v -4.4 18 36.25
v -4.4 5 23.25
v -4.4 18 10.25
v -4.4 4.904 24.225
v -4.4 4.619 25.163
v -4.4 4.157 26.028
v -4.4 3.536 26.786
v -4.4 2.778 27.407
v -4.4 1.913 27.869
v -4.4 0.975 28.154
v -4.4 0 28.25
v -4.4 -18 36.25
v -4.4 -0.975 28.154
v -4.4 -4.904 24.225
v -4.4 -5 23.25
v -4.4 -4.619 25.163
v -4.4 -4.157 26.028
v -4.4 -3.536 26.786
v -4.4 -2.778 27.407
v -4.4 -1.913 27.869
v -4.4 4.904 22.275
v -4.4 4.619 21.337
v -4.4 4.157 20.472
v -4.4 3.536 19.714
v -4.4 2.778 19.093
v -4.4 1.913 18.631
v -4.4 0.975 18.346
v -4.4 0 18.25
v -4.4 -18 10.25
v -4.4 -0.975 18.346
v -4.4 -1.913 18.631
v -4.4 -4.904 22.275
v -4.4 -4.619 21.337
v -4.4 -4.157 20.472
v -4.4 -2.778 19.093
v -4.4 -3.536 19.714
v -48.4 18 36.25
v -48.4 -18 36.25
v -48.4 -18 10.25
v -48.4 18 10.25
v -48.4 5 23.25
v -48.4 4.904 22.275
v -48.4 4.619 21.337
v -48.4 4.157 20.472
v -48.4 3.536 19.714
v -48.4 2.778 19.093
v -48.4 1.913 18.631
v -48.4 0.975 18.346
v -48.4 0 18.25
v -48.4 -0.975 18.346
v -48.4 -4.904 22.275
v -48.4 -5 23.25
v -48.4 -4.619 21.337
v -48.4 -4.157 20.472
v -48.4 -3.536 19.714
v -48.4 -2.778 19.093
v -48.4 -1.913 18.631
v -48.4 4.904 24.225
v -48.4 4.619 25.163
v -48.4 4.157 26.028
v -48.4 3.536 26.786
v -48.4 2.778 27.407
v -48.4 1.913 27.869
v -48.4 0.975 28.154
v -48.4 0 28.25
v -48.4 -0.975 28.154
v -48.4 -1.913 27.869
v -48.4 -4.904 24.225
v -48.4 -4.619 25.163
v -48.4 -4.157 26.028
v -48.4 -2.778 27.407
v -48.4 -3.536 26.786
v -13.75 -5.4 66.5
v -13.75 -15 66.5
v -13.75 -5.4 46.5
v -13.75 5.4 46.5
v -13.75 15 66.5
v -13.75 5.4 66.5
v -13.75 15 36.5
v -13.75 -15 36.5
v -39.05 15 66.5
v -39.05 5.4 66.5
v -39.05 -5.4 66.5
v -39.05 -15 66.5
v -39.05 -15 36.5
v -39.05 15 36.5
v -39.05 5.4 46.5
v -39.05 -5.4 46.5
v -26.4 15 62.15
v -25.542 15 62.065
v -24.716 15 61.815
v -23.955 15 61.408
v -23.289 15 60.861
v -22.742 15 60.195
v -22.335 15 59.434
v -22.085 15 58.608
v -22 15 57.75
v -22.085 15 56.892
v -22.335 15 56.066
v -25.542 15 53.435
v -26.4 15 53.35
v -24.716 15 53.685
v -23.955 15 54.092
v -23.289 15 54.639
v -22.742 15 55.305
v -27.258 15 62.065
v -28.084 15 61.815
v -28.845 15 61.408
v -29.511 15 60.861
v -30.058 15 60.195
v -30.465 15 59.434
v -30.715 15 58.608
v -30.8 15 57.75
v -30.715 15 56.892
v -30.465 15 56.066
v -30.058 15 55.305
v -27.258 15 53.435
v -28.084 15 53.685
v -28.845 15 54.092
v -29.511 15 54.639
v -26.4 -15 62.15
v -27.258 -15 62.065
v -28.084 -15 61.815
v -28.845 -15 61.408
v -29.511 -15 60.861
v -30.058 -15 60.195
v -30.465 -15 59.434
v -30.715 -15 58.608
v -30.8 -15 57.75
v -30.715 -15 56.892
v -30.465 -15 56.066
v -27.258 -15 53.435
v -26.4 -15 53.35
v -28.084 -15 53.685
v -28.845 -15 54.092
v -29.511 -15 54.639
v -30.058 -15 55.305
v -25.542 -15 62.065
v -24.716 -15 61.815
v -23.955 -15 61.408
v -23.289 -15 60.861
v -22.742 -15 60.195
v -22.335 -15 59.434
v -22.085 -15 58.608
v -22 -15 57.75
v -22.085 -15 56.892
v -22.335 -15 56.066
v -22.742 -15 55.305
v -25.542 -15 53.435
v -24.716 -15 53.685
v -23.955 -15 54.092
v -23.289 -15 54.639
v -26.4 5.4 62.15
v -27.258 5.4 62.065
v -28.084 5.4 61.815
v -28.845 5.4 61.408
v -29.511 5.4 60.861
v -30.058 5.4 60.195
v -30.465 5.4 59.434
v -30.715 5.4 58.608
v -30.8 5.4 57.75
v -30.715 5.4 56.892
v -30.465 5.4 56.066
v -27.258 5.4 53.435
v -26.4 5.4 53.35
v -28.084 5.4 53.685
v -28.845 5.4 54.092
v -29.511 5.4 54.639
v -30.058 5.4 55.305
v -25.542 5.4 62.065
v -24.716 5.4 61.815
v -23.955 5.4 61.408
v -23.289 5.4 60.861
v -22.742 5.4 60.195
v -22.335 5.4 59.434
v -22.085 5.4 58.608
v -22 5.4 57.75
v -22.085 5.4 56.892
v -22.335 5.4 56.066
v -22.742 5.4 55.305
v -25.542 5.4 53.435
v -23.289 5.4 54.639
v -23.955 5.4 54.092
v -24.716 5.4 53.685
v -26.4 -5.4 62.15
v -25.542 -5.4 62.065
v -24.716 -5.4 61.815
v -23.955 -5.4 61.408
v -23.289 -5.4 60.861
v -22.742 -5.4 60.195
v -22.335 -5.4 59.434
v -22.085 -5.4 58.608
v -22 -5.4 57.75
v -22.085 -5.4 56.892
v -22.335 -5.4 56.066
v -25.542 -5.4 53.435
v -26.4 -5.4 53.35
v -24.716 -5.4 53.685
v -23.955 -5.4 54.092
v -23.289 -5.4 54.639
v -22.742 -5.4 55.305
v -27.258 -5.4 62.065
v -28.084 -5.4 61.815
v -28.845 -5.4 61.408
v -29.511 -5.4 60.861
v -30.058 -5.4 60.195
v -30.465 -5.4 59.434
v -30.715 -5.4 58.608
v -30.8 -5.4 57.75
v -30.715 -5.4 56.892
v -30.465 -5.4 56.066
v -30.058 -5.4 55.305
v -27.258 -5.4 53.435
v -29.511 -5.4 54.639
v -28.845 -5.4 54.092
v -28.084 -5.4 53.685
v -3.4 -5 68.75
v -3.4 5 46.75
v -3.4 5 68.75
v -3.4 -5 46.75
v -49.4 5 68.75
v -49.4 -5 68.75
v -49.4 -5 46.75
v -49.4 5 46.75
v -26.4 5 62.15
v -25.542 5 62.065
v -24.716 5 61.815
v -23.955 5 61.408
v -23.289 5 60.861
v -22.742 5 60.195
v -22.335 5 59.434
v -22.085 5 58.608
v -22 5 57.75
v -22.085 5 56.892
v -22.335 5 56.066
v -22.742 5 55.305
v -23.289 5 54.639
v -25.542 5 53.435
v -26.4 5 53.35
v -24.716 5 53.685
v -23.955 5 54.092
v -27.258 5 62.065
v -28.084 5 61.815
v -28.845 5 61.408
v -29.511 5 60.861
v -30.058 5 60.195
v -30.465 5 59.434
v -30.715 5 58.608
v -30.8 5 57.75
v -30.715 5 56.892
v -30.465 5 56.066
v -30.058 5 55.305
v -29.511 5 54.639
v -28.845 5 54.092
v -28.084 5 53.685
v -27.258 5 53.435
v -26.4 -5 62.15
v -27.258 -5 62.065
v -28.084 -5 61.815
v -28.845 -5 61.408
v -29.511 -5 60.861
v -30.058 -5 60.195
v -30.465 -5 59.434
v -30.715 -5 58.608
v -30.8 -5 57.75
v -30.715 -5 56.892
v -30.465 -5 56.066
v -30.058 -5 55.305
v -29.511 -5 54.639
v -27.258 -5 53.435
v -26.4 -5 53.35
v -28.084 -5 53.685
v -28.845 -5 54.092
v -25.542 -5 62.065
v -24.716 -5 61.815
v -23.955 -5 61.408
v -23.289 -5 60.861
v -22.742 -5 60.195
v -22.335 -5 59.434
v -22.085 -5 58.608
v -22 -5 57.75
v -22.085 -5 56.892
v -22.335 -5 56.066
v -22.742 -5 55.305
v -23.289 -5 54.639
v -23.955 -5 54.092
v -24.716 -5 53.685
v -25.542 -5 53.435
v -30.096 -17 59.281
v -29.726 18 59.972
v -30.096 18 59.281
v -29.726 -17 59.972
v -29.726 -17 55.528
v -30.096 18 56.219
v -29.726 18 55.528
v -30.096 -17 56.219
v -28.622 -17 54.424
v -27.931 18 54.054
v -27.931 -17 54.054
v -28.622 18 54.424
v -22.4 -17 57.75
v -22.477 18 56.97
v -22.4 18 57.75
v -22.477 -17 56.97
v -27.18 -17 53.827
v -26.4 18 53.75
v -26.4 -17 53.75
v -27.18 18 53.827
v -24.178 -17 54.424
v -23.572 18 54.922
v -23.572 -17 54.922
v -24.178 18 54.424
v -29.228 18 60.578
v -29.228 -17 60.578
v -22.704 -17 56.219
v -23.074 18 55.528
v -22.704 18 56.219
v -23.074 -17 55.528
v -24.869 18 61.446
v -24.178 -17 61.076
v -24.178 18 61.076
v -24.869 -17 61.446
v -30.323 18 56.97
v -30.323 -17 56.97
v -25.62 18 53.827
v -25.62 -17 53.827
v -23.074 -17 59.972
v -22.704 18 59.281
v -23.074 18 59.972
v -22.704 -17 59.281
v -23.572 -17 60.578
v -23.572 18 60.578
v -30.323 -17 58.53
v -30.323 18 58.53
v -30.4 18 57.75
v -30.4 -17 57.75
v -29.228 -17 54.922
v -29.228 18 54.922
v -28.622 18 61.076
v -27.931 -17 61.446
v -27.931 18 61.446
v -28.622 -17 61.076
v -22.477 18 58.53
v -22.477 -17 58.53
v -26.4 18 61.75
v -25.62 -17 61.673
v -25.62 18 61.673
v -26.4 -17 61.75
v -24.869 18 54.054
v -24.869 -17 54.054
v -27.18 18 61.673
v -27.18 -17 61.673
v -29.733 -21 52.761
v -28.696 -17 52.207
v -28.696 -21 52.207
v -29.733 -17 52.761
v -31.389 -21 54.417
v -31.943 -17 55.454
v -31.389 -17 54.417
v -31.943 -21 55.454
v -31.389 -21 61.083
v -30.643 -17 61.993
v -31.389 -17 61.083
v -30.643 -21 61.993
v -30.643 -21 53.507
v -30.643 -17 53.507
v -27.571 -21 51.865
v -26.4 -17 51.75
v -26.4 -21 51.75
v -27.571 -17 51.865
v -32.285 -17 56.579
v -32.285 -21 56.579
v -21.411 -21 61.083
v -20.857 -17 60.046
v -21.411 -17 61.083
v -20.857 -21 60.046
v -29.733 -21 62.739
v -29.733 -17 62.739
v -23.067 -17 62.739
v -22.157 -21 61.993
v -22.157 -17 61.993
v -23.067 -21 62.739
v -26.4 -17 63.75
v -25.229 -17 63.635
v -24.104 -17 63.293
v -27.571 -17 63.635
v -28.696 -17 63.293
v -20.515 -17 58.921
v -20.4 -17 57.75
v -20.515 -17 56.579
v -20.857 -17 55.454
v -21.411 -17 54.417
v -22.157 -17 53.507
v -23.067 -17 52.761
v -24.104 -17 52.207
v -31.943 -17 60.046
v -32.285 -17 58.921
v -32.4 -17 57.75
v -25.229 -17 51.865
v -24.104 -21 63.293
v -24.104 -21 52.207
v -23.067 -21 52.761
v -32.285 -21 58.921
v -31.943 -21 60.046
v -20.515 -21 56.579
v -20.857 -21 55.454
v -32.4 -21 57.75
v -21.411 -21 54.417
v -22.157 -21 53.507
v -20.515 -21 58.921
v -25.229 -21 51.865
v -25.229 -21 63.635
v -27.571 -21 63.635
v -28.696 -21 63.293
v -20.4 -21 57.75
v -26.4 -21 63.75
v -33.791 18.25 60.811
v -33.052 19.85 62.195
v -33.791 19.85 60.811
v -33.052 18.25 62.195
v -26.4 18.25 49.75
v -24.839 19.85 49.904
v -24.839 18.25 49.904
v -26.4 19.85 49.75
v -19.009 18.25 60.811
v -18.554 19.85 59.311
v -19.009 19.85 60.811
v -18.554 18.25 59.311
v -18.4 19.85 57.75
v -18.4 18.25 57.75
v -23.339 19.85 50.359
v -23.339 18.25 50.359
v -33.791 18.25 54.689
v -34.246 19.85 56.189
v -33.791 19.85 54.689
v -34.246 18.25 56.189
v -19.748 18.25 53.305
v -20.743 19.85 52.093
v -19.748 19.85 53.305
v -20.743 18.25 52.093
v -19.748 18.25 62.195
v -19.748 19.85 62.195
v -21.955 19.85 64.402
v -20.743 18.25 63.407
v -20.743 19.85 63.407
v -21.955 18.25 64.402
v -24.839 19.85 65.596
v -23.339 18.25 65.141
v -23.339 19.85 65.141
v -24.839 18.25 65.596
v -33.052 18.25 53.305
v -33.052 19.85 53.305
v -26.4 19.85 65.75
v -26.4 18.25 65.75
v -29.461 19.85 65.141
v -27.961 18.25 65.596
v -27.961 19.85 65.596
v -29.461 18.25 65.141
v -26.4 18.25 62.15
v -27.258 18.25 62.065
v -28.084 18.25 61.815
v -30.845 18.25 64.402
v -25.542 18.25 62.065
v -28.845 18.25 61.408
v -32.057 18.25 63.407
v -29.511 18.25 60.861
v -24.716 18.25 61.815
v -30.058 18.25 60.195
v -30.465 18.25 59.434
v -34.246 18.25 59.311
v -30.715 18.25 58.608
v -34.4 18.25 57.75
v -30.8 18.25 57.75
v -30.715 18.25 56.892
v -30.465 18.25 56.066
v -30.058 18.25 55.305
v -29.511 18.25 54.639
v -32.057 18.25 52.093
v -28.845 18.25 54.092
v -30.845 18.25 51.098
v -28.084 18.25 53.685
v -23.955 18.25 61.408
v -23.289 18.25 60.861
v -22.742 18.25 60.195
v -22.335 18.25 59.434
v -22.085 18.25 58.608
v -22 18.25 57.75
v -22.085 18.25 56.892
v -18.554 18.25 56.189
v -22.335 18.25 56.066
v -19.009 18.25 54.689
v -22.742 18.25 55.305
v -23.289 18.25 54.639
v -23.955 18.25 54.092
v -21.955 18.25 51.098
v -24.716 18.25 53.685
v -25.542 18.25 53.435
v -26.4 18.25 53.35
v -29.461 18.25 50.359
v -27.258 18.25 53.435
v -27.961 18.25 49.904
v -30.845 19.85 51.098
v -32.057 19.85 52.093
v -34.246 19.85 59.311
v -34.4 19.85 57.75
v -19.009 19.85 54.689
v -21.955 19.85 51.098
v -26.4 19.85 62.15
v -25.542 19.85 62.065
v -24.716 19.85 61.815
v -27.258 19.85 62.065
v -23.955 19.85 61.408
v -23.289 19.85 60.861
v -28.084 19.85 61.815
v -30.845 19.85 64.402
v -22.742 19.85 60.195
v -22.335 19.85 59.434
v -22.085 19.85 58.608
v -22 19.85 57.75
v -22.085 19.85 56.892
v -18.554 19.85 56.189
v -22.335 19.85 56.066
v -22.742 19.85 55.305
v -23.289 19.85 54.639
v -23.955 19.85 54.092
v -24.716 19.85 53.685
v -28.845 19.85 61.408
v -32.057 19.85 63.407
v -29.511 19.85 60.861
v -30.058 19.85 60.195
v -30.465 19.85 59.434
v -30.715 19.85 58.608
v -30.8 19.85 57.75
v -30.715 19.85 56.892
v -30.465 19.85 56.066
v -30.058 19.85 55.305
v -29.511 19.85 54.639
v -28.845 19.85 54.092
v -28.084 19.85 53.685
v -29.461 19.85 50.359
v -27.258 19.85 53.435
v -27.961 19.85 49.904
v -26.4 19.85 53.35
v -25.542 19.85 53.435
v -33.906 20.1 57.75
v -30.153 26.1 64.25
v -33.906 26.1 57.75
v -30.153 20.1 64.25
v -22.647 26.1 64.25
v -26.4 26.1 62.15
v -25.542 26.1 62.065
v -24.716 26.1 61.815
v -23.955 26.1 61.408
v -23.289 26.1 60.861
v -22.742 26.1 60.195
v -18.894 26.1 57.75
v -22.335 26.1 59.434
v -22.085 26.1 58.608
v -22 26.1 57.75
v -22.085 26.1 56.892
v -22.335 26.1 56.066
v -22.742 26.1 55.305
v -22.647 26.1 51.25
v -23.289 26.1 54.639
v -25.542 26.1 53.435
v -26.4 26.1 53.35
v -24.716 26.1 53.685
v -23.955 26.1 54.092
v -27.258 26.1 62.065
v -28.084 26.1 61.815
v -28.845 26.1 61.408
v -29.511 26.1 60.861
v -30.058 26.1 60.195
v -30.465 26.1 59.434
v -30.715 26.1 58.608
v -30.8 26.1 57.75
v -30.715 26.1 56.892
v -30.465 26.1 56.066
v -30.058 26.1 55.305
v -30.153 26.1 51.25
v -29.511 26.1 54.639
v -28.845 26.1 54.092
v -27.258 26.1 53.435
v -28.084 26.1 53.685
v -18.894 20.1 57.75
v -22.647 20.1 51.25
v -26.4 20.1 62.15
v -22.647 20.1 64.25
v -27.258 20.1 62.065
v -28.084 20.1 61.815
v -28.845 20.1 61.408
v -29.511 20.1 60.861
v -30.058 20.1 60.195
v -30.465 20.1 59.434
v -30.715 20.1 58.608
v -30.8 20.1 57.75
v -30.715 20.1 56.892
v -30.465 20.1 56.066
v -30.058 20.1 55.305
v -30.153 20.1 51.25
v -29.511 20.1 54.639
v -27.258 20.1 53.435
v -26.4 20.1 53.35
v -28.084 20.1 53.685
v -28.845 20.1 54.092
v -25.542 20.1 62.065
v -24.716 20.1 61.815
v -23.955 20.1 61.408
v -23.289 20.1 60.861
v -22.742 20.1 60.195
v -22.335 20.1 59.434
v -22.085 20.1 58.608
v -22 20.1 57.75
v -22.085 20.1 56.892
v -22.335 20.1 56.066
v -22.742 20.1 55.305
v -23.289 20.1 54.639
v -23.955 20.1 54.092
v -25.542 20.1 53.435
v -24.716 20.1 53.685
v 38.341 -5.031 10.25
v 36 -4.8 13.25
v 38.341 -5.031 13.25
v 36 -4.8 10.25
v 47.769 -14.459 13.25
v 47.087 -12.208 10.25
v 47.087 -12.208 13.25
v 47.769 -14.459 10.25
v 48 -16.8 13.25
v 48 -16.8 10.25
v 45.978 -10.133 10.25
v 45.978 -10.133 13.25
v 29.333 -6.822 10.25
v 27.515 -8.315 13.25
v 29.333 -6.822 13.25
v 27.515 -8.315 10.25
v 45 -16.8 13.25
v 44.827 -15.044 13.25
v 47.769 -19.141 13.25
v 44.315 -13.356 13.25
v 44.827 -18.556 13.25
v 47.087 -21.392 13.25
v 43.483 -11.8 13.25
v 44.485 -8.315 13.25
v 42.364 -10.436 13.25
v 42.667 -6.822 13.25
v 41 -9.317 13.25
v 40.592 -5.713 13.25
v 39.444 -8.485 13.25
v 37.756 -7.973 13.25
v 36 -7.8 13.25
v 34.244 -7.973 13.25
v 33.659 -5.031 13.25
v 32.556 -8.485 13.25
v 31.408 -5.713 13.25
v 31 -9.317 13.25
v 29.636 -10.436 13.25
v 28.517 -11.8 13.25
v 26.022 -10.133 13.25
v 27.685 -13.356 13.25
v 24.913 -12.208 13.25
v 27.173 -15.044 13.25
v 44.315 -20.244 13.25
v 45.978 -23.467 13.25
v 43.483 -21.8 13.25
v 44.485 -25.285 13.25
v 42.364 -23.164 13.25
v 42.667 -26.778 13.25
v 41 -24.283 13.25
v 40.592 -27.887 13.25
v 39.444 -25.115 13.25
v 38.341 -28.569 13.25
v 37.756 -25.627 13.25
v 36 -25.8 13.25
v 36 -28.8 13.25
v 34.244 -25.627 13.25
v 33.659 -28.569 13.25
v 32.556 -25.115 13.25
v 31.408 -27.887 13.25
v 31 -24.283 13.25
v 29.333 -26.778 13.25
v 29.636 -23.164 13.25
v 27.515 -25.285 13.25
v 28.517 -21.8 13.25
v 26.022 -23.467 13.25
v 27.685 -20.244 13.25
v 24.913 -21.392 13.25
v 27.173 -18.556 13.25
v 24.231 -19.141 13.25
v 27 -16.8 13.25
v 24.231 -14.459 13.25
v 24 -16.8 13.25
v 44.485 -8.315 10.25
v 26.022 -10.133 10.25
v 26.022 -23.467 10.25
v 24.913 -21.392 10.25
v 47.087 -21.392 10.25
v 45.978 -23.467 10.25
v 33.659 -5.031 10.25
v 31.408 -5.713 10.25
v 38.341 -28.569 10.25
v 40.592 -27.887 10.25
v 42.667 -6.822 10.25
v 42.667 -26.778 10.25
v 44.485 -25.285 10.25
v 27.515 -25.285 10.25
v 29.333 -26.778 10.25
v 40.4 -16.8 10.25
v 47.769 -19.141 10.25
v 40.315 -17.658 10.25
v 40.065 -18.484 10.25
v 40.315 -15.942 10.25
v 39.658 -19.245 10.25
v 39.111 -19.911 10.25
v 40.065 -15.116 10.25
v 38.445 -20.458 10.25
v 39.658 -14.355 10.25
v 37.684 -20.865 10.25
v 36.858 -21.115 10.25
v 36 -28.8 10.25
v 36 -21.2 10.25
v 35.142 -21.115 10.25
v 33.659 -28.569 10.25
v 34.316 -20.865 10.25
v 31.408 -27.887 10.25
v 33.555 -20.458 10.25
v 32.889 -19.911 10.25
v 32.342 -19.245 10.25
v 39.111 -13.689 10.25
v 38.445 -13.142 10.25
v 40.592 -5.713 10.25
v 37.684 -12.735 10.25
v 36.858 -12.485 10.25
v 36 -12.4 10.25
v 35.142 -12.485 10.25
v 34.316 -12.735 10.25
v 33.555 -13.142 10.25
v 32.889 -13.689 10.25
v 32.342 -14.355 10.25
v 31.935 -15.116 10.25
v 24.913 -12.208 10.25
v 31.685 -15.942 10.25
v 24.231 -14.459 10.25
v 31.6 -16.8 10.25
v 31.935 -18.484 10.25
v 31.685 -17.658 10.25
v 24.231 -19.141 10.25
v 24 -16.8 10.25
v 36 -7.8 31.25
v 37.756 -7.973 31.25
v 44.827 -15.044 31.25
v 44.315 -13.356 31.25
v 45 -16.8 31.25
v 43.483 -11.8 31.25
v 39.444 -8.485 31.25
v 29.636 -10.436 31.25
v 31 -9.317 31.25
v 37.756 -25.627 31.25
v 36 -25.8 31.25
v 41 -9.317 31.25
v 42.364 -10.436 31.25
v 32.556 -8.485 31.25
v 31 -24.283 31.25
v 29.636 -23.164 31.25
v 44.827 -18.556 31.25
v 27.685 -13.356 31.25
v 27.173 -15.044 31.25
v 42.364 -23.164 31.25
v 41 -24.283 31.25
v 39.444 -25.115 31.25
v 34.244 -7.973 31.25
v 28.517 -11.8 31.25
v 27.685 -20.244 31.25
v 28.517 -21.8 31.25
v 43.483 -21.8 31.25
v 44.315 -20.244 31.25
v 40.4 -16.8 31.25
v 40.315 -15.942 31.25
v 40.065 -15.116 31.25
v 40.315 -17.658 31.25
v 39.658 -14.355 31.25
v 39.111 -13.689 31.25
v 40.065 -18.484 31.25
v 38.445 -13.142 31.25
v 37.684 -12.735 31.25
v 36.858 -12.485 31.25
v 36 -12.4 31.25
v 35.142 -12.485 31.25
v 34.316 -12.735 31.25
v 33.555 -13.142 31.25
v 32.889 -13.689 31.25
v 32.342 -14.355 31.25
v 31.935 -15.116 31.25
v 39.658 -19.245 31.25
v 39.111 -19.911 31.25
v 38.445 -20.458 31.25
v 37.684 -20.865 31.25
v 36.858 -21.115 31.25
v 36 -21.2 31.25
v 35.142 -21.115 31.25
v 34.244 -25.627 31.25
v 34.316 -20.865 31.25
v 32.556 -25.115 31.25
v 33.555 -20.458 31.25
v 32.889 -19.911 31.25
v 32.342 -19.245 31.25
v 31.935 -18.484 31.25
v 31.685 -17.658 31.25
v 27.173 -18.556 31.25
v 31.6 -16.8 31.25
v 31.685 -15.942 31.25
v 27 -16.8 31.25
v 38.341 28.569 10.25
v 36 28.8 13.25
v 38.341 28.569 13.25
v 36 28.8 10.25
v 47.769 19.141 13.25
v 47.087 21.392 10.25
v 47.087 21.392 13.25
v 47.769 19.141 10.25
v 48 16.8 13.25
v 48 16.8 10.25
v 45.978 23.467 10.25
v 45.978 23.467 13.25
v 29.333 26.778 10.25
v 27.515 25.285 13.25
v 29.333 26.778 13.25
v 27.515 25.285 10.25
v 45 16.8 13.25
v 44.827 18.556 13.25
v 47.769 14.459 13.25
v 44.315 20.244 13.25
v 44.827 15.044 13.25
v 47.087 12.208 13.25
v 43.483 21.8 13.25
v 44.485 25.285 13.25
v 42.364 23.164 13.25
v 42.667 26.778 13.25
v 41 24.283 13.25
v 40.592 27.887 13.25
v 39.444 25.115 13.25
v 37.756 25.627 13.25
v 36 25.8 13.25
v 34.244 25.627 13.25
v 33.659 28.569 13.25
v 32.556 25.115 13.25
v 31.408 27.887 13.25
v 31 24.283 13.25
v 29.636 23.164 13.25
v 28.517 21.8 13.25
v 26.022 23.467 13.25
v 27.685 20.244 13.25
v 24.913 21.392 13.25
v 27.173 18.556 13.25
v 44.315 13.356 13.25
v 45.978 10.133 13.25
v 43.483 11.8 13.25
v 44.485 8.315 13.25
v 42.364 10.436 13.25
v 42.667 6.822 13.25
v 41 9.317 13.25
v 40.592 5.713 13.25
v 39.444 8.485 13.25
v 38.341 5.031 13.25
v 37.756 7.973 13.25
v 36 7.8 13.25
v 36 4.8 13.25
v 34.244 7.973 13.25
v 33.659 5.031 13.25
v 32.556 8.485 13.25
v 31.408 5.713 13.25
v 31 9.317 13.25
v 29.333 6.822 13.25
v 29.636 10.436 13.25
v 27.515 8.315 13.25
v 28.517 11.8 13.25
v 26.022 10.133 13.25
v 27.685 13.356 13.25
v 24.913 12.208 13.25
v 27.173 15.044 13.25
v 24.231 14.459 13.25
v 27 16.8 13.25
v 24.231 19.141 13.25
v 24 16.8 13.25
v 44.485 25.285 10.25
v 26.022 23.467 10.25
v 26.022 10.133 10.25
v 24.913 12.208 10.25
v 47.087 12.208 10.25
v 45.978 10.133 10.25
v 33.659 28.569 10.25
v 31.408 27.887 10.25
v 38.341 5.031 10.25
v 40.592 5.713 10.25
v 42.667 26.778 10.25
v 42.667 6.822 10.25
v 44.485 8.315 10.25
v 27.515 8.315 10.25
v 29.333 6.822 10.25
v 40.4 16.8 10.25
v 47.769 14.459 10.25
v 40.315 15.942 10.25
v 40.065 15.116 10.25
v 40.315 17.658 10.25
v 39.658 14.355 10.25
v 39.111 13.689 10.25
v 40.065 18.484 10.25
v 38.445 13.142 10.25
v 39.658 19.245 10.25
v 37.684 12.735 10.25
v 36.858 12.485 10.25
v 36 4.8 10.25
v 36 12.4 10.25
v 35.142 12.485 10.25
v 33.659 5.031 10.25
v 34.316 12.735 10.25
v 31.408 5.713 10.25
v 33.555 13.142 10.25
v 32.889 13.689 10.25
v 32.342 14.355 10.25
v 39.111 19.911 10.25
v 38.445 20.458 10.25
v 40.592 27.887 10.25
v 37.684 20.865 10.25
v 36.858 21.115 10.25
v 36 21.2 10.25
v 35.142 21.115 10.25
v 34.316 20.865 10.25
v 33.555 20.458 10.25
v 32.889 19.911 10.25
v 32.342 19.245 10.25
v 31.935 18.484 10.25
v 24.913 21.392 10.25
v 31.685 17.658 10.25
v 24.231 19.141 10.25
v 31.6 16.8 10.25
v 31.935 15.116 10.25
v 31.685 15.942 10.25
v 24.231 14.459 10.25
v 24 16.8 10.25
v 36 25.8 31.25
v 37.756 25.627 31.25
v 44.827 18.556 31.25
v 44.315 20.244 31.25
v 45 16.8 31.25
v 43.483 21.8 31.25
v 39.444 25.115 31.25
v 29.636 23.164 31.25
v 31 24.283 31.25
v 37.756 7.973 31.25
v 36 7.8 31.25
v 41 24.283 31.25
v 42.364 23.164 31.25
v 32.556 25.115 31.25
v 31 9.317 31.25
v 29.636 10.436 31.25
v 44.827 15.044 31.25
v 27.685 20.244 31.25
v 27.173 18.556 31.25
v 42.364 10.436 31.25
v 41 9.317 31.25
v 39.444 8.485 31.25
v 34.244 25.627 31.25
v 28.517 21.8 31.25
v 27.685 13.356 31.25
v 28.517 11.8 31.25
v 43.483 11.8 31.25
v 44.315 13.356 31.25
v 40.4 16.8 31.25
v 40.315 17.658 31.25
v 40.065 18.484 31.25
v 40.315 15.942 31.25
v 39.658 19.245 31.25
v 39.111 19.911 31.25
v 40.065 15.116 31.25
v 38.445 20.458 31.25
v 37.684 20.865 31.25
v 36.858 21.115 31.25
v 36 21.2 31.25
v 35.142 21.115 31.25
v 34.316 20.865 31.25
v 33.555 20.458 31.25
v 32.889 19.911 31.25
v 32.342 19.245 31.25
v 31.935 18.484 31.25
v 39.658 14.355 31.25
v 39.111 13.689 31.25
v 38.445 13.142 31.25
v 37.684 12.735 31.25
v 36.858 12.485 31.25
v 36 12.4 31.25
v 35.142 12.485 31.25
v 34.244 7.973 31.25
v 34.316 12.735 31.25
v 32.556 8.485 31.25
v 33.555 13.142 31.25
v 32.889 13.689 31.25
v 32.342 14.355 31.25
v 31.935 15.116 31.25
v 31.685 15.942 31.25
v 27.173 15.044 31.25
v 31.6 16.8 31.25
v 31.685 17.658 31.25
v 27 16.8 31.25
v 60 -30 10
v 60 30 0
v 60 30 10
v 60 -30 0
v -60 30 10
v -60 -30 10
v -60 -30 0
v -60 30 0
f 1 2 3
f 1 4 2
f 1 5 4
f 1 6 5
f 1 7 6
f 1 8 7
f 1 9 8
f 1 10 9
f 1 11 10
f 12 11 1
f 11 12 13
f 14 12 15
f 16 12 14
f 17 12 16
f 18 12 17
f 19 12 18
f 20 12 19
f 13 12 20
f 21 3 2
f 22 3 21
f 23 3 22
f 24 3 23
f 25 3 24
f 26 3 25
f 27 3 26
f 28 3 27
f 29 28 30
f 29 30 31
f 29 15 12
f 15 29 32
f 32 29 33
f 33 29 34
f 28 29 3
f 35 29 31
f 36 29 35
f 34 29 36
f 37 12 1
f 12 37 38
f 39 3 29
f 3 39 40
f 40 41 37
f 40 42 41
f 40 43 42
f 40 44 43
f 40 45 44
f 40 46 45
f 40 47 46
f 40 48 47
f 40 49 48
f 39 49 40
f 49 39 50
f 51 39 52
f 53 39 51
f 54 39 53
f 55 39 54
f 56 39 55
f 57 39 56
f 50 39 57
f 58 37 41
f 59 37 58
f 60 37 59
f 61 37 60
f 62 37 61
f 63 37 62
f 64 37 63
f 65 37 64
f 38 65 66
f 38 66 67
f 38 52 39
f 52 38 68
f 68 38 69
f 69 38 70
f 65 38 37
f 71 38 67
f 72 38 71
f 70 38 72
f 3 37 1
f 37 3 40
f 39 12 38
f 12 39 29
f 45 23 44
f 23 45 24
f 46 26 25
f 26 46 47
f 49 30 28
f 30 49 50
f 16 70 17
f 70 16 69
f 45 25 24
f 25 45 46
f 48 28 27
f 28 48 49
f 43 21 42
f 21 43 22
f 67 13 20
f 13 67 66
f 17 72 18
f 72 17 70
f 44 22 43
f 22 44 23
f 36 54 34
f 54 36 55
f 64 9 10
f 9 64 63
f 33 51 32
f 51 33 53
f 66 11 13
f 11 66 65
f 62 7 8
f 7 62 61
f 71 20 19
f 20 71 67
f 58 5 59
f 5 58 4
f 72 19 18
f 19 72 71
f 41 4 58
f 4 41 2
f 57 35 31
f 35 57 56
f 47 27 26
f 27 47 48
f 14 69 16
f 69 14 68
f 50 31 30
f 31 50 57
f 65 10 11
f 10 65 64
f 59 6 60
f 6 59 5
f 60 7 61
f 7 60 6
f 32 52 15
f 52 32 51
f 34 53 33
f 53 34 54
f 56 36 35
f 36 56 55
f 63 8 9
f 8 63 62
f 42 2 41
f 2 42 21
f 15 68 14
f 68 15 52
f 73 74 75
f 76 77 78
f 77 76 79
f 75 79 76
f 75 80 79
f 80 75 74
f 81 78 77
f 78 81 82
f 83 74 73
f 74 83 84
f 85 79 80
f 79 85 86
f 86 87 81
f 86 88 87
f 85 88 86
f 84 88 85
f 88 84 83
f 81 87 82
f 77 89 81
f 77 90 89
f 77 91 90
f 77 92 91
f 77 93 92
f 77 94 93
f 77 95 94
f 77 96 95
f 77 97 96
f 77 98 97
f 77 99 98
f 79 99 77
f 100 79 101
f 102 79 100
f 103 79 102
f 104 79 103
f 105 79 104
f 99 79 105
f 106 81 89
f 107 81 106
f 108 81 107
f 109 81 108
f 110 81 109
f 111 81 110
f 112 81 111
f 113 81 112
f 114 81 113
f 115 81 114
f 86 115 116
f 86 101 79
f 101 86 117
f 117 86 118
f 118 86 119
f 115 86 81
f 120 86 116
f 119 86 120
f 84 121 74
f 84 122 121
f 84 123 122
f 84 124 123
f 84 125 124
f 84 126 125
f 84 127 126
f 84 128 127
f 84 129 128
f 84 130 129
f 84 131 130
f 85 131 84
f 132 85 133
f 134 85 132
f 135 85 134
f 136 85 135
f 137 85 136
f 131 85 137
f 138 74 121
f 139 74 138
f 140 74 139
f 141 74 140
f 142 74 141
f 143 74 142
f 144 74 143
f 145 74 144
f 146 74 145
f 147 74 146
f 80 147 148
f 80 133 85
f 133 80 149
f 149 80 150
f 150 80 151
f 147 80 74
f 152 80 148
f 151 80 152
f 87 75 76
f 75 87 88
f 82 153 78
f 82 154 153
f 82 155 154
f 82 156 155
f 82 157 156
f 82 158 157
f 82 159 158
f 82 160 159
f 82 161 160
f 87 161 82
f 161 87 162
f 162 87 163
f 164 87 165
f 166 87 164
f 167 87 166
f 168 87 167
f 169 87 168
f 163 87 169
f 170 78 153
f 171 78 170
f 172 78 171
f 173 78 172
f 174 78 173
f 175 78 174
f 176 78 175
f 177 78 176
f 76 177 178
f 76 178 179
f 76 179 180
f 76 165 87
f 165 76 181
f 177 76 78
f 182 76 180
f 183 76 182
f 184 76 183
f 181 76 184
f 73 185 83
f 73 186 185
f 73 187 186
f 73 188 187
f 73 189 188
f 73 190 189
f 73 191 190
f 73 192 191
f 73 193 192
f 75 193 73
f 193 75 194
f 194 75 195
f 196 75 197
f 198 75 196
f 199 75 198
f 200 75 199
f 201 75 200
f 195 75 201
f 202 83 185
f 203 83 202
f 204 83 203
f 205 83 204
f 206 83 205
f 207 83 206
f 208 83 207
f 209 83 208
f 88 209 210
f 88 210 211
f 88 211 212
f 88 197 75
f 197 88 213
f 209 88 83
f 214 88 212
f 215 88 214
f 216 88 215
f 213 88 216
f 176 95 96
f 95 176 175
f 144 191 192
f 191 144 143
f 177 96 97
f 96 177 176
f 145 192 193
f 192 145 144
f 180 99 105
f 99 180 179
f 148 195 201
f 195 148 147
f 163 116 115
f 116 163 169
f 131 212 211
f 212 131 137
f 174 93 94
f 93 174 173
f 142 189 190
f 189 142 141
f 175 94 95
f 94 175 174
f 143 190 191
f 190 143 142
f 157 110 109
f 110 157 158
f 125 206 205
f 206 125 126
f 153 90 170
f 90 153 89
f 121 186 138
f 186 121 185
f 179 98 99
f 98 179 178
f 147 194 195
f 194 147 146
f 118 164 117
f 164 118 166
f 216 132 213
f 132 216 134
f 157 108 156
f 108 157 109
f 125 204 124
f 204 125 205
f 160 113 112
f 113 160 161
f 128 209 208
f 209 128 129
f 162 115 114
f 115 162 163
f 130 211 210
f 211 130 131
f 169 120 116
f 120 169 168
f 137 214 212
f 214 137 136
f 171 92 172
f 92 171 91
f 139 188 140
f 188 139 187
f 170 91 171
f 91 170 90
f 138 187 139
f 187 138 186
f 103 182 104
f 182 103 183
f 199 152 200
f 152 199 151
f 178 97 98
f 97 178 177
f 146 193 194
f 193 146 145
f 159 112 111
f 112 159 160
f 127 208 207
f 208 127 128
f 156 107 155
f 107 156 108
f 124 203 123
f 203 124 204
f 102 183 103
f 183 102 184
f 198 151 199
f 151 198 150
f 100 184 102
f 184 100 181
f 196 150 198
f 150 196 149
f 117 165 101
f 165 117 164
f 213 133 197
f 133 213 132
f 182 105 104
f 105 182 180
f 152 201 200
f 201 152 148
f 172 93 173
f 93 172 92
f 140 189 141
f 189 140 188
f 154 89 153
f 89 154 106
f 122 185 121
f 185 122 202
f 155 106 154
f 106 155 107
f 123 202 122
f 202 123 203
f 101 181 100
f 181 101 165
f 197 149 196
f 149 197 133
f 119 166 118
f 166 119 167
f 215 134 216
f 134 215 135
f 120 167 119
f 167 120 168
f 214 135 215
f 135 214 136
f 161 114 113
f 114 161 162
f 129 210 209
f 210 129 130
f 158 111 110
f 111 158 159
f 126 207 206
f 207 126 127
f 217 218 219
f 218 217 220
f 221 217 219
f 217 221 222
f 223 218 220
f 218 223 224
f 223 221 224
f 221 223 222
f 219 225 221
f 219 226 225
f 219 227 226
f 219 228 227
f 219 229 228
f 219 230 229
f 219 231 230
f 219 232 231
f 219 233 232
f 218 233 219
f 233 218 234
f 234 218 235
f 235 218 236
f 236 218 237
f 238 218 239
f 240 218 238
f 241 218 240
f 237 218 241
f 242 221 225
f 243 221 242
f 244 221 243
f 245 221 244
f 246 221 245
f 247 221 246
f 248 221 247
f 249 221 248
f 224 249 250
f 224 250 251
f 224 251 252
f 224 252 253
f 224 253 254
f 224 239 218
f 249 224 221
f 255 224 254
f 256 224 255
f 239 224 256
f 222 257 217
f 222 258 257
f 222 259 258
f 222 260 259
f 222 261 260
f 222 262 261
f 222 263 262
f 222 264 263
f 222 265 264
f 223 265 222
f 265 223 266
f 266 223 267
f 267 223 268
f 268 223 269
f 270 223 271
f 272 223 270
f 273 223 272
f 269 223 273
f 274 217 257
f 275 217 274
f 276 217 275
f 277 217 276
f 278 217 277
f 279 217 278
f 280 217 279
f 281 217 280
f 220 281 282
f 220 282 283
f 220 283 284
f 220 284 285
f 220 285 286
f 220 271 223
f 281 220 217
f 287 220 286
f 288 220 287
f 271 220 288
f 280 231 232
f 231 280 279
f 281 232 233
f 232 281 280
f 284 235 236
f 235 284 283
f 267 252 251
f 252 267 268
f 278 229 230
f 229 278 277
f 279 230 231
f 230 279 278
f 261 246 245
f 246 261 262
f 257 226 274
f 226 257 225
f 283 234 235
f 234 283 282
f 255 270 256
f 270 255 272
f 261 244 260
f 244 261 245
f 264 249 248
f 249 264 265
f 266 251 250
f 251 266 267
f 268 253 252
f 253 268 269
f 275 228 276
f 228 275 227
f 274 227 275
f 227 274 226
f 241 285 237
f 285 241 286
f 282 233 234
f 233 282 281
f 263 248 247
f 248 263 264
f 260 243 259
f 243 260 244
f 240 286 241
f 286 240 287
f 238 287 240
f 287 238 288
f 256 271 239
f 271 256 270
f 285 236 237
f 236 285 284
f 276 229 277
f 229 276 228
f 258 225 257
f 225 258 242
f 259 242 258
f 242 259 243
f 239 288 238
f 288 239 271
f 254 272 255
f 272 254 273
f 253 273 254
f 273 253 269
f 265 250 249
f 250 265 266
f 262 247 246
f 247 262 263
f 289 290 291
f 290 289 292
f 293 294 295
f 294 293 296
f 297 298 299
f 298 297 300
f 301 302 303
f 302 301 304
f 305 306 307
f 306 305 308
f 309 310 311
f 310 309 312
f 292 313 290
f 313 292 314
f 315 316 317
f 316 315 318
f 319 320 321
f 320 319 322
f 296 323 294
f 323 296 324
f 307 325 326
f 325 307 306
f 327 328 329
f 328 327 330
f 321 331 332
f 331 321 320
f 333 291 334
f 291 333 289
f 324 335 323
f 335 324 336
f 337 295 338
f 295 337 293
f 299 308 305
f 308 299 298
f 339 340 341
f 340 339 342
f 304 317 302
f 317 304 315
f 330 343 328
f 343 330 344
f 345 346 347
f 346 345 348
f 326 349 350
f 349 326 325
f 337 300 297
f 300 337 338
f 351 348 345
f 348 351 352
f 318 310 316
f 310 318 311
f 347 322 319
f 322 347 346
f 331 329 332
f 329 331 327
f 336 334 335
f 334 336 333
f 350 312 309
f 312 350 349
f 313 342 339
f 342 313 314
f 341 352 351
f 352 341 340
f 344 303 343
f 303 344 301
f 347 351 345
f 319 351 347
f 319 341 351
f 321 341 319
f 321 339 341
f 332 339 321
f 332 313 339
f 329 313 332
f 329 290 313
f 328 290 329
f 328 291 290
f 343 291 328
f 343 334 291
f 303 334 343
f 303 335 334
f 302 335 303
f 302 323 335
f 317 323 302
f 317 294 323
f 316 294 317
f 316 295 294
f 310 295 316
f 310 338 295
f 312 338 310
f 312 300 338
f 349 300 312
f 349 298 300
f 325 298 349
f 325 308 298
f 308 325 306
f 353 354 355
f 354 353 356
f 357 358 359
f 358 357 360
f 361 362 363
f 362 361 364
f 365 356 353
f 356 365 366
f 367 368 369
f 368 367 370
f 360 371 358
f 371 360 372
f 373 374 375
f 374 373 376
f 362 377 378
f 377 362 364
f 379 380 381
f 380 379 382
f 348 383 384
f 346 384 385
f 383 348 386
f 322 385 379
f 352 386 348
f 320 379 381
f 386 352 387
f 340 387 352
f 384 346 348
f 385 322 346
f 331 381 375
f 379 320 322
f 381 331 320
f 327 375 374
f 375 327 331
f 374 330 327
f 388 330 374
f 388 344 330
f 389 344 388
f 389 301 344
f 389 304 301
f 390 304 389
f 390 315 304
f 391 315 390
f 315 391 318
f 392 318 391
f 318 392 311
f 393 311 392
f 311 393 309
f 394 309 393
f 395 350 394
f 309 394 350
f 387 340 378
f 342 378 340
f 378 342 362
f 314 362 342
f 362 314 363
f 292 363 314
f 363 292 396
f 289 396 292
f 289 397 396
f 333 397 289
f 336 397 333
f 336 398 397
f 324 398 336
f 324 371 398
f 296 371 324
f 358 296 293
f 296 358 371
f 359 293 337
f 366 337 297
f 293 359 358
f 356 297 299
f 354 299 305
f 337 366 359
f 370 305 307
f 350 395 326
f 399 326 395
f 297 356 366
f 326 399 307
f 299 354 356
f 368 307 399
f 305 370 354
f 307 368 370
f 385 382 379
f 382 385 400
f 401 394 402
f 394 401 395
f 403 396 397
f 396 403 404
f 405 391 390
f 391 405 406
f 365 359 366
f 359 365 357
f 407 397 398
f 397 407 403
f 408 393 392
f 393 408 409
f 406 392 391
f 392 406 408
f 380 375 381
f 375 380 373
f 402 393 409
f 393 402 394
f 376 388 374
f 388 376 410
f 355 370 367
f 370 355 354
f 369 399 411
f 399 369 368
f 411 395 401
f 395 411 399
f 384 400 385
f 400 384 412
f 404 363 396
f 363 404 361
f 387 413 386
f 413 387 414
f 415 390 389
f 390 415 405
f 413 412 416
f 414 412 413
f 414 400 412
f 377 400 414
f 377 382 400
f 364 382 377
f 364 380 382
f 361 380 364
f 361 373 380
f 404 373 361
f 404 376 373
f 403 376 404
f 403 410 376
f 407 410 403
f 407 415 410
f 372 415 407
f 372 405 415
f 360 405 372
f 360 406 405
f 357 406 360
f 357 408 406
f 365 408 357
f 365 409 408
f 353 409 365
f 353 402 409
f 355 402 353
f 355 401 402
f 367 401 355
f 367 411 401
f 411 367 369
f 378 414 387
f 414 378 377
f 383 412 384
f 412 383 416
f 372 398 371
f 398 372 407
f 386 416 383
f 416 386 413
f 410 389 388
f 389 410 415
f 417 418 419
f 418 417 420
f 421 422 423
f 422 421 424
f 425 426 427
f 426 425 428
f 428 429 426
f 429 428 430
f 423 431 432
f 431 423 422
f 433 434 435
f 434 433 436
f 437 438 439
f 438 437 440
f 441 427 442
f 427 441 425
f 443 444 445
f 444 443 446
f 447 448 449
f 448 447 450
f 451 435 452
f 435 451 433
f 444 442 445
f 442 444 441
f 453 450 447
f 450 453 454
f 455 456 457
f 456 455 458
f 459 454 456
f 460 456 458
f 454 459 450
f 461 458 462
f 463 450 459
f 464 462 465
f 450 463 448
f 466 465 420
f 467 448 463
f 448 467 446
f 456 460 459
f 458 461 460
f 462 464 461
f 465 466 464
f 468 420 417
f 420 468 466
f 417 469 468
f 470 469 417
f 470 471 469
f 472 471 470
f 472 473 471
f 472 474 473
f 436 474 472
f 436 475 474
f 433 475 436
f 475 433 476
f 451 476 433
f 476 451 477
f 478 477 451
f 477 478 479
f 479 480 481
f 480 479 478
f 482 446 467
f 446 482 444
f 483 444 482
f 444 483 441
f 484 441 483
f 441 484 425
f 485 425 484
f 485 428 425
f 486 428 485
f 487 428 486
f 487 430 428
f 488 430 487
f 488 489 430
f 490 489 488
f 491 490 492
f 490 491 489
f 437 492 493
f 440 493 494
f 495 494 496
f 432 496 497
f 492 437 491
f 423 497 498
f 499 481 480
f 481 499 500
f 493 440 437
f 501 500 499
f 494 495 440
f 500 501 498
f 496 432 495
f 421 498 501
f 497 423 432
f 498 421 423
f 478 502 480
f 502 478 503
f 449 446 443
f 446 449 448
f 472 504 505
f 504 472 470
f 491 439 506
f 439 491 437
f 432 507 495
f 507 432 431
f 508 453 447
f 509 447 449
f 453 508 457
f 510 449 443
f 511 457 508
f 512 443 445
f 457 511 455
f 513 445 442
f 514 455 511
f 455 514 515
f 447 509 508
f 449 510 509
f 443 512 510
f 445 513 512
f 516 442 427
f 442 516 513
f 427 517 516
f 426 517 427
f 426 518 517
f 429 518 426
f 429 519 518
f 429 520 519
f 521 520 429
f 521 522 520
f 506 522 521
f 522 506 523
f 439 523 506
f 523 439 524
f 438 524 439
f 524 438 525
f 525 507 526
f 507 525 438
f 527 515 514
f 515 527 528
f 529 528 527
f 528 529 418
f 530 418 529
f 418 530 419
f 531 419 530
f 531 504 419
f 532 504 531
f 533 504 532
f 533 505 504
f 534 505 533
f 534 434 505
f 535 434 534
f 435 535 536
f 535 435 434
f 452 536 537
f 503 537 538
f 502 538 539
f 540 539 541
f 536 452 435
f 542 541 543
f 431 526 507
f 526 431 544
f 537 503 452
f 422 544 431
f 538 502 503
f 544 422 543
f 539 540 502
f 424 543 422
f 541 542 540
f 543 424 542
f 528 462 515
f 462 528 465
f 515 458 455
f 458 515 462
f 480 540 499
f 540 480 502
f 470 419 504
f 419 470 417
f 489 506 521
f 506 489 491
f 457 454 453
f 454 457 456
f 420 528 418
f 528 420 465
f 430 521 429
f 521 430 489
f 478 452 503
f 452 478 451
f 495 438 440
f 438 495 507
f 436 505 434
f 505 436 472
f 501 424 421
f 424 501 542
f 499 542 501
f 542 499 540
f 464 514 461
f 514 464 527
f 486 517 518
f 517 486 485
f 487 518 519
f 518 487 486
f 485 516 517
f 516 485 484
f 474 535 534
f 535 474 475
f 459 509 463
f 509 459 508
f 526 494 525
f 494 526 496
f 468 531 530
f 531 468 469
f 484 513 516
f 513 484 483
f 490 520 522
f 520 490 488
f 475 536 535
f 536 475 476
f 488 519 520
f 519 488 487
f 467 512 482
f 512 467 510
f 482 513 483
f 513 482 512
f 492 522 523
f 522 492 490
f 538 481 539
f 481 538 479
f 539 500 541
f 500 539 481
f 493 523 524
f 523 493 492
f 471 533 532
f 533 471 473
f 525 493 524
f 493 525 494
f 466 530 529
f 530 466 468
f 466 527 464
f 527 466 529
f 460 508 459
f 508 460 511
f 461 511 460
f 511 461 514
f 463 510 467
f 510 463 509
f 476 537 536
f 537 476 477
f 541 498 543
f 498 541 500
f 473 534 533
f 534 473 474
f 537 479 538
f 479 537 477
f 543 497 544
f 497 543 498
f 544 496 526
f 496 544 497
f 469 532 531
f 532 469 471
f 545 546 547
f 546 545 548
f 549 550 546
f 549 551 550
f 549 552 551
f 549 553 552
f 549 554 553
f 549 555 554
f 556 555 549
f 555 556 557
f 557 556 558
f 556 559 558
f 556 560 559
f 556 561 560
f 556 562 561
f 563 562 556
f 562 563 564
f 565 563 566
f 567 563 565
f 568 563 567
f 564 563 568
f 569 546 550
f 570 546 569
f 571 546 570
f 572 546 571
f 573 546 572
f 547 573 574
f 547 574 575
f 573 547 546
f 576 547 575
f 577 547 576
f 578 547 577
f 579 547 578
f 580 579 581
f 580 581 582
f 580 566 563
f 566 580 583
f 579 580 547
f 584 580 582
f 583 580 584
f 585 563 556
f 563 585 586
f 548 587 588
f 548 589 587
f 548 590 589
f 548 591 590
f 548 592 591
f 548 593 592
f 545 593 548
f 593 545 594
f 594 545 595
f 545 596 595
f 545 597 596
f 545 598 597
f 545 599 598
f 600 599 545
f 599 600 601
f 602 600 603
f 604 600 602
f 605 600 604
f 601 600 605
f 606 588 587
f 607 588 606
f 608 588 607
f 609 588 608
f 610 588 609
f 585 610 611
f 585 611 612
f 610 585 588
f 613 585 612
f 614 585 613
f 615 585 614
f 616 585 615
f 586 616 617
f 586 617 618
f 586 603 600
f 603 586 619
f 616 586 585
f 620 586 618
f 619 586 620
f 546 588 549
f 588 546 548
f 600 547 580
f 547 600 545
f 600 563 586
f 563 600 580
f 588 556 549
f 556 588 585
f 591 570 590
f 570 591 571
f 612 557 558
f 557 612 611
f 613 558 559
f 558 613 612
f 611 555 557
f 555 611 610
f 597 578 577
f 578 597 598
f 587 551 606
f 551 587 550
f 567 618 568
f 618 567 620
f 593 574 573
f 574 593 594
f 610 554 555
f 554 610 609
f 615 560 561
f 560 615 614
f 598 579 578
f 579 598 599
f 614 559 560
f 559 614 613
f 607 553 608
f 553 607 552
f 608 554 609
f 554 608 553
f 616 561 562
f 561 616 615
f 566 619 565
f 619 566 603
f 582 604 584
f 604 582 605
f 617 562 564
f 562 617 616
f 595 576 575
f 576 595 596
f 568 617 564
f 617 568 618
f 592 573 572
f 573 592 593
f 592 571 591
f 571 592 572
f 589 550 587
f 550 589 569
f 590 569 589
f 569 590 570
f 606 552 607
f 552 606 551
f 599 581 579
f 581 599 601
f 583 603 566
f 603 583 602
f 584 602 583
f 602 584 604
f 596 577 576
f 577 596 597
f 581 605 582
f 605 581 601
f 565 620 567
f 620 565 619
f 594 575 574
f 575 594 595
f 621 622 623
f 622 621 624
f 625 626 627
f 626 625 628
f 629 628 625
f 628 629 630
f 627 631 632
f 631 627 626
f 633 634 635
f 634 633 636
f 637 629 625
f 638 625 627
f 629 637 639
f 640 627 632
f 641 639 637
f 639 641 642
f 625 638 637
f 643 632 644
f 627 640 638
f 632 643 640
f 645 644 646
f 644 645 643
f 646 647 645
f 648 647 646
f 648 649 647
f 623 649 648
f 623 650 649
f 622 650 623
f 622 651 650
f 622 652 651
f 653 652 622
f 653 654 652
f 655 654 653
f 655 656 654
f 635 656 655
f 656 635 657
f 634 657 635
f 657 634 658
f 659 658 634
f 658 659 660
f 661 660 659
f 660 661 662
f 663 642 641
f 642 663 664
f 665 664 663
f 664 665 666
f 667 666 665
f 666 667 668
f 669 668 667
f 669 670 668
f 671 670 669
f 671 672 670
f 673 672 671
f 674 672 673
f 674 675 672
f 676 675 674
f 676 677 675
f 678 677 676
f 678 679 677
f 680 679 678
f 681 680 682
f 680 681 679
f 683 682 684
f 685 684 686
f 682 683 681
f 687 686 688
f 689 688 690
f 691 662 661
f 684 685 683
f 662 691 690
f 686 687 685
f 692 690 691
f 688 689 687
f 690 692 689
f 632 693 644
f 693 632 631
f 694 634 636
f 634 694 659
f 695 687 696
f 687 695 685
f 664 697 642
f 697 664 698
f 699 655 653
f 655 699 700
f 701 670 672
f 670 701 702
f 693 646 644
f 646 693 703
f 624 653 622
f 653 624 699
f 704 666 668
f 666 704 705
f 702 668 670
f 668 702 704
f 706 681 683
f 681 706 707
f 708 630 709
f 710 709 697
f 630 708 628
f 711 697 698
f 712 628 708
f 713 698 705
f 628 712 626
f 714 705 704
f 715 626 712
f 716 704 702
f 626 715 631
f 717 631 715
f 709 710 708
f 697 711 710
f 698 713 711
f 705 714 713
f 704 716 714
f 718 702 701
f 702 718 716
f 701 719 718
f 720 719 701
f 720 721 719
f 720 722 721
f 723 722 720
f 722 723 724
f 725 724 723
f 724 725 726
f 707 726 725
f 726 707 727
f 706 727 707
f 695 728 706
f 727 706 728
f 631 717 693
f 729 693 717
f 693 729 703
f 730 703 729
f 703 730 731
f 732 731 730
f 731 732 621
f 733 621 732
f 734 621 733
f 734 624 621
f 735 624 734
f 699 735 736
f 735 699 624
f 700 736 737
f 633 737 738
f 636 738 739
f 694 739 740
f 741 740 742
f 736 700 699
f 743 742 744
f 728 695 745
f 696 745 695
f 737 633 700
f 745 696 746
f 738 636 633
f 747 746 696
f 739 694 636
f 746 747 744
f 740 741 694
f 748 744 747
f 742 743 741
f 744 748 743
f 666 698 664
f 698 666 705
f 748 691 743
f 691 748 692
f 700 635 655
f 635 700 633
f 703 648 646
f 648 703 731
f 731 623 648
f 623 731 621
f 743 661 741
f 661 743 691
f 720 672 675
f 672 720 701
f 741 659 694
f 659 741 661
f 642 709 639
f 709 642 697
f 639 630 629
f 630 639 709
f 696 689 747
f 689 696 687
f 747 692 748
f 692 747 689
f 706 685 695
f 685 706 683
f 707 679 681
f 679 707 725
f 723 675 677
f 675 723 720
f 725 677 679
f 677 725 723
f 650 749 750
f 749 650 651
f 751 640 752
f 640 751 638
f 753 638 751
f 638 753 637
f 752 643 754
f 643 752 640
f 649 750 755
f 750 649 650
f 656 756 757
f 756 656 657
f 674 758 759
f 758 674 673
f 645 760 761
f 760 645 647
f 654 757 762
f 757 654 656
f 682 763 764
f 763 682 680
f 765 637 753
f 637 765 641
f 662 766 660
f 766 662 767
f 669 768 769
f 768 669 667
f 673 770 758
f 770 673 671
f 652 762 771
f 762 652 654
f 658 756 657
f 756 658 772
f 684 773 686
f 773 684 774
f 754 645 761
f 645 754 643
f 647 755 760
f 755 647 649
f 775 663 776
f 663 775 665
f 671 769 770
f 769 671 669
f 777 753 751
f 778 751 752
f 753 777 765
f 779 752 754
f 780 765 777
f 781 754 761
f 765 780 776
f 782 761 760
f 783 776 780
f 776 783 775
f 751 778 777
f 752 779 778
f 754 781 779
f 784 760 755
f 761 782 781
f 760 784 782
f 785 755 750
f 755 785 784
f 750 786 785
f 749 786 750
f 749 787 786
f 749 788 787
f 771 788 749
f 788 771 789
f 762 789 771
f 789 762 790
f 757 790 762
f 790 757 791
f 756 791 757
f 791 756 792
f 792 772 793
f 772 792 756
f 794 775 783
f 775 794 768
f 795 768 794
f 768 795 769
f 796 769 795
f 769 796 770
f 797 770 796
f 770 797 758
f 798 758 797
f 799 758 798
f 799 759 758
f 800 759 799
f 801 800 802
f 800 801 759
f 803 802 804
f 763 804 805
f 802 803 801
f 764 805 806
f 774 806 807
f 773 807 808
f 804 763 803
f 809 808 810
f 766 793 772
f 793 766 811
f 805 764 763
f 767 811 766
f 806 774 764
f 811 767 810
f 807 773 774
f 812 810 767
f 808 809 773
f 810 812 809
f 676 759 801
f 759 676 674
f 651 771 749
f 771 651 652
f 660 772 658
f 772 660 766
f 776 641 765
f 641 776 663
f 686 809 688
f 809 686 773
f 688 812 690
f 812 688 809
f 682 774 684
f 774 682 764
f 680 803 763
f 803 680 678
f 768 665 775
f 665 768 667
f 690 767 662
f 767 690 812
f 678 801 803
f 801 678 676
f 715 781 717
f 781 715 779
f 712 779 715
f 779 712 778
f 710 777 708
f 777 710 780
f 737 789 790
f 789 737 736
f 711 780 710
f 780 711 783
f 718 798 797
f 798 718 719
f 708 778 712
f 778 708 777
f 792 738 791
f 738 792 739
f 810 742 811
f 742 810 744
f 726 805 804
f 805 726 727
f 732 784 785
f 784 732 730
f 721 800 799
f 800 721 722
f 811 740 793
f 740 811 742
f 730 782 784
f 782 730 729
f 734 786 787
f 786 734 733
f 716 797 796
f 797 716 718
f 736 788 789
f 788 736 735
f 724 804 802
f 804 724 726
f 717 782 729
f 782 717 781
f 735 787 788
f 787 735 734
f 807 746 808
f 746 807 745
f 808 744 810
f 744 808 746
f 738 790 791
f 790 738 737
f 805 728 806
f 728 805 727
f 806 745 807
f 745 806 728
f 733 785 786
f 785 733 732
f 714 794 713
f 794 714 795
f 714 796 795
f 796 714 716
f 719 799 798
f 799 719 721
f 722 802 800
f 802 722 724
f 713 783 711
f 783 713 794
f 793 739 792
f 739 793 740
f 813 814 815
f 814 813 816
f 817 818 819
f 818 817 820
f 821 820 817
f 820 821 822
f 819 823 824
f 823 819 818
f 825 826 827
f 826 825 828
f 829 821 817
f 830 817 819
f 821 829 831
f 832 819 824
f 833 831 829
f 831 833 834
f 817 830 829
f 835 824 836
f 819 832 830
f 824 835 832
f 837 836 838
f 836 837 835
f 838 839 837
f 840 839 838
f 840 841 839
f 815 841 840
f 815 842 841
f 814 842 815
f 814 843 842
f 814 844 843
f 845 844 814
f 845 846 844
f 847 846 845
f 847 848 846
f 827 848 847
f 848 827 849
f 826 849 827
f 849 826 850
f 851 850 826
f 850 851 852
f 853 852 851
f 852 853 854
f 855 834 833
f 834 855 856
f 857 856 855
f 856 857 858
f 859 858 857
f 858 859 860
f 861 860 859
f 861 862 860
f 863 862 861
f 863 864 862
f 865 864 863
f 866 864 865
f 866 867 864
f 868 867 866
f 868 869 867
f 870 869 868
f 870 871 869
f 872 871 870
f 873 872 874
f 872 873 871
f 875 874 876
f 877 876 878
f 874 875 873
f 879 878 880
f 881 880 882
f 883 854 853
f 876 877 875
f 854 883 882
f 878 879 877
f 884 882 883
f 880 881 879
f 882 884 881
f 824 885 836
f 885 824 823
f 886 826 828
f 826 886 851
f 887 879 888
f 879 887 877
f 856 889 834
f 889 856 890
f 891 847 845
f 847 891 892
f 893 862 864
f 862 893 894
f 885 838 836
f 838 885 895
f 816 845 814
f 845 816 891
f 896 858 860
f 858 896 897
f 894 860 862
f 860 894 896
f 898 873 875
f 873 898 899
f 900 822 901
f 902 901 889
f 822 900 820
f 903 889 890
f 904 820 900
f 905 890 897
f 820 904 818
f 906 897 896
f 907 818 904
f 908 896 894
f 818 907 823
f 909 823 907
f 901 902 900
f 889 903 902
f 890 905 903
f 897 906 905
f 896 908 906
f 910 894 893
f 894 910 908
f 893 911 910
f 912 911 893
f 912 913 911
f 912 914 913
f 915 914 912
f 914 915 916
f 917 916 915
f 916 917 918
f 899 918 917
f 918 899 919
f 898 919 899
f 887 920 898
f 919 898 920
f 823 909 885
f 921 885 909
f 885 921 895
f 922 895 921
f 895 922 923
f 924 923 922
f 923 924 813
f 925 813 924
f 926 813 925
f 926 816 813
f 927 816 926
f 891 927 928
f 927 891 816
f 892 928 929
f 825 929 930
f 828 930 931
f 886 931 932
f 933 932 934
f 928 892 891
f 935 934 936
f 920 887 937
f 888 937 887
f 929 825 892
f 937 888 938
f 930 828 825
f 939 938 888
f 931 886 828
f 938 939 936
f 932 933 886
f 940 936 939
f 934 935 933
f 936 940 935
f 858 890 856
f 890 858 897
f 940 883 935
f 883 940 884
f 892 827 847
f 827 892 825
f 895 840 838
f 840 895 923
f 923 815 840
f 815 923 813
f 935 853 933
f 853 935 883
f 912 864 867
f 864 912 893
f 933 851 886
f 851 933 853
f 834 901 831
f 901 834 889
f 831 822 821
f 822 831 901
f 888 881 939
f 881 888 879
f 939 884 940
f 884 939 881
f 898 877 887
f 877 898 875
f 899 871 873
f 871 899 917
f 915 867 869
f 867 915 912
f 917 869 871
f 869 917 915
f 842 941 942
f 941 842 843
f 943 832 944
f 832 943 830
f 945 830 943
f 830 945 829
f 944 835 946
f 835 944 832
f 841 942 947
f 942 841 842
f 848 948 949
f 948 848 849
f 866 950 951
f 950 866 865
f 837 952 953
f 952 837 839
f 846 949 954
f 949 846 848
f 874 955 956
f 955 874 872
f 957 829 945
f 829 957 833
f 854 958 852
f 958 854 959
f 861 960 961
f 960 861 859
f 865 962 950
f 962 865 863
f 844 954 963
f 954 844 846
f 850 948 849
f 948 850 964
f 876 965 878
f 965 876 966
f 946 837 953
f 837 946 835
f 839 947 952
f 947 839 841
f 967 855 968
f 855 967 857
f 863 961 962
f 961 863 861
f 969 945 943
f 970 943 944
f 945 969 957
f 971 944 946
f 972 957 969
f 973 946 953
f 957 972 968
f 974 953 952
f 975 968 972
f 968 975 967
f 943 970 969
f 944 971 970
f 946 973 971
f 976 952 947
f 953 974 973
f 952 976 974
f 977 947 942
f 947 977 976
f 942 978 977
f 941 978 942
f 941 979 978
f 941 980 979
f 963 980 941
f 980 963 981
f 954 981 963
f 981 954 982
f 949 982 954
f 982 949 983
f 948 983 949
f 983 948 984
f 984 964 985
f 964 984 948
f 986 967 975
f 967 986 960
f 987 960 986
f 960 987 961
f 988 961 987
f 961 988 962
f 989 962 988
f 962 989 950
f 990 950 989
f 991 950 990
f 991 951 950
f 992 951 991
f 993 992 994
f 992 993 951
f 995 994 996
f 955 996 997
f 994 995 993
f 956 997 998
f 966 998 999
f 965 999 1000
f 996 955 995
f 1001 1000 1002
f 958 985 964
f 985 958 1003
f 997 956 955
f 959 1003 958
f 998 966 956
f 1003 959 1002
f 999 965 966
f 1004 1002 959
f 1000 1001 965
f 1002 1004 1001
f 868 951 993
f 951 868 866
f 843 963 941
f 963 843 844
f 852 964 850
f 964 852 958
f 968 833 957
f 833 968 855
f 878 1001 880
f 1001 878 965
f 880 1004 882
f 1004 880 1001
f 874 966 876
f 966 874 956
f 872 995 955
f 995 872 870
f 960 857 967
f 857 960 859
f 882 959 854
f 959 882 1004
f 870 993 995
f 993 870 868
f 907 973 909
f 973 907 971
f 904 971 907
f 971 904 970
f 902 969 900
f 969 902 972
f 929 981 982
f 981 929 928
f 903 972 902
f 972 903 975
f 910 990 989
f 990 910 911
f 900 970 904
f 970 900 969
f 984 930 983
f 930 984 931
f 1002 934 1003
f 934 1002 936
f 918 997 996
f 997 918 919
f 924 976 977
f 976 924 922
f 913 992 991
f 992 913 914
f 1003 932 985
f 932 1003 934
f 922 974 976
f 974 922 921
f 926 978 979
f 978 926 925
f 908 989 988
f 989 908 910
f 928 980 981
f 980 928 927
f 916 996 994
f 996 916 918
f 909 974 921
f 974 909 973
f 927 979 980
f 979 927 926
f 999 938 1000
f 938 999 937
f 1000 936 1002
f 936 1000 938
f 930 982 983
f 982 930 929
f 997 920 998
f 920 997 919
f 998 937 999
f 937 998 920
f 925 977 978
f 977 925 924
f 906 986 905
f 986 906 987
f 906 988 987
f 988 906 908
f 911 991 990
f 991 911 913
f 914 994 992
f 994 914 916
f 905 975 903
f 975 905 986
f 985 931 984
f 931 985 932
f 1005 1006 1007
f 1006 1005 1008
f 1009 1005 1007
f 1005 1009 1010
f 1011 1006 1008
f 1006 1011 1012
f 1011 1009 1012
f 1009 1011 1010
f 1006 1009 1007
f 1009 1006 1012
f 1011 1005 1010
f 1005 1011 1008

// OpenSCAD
$fn = 32;

// ------------------------------------------------------------------------
// Indexing jig: plate 120 x 60 mm, pin d8
// Every part is its own module, assembly() places every instance.
// ------------------------------------------------------------------------

// --- part 1 ---
module jig_plate() {
  difference() {
    translate([-60, -30, 0]) cube([120, 60, 10]);
  }
}

// --- part 2 ---
module locator_block() {
  difference() {
    translate([-22, -18, 0]) cube([44, 36, 26]);
    translate([0, 0, 13]) rotate([0, 90, 0]) cylinder(h = 46, d = 10, center = true);
  }
}

// --- part 3 ---
module index_fork() {
  difference() {
    translate([-12.65, -15, 0]) cube([25.3, 30, 30]);
    translate([-13.65, -5.4, 10]) cube([27.3, 10.8, 21]);
    translate([0, 0, 21.25]) rotate([90, 0, 0]) cylinder(h = 32, d = 8.8, center = true);
  }
}

// --- part 4 ---
module index_arm() {
  difference() {
    translate([-23, -5, 0]) cube([46, 10, 22]);
    translate([0, 0, 11]) rotate([90, 0, 0]) cylinder(h = 12, d = 8.8, center = true);
  }
}

// --- part 5 ---
module index_pin() {
  rotate([0, 90, 0]) cylinder(h = 36, d = 8, center = true);
  translate([-21, 0, 0]) rotate([0, 90, 0]) cylinder(h = 4, d = 12);
}

// --- part 6 ---
module pin_washer() {
  difference() {
      translate([0, 0, 0]) cylinder(h = 1.6, d = 16);
      translate([0, 0, -1]) cylinder(h = 3.6, d = 8.8);
    }
}

// --- part 7 ---
module lock_nut() {
  difference() {
    linear_extrude(height = 6) polygon(points = [[7.506, 0], [3.753, 6.5], [-3.753, 6.5], [-7.506, 0], [-3.753, -6.5], [3.753, -6.5]]);
    translate([0, 0, -1]) cylinder(h = 8, d = 8.8);
  }
}

// --- part 8 ---
module guide_bush_a() {
  difference() {
    union() {
      cylinder(h = 3, d = 24);
      translate([0, 0, 3]) cylinder(h = 18, d = 18);
    }
    translate([0, 0, -1]) cylinder(h = 23, d = 8.8);
  }
}

// --- part 9 ---
module guide_bush_b() {
  difference() {
    union() {
      cylinder(h = 3, d = 24);
      translate([0, 0, 3]) cylinder(h = 18, d = 18);
    }
    translate([0, 0, -1]) cylinder(h = 23, d = 8.8);
  }
}

// --- assembly ---
module assembly() {
  color([0.80, 0.24, 0.20]) translate([0, 0, 0]) rotate([0, 0, 0]) jig_plate();
  color([0.20, 0.45, 0.75]) translate([-26.4, 0, 10.25]) rotate([0, 0, 0]) locator_block();
  color([0.25, 0.62, 0.32]) translate([-26.4, 0, 36.5]) rotate([0, 0, 0]) index_fork();
  color([0.92, 0.70, 0.18]) translate([-26.4, 0, 46.75]) rotate([0, 0, 0]) index_arm();
  color([0.58, 0.35, 0.70]) translate([-26.4, 0, 57.75]) rotate([0, 0, 90]) index_pin();
  color([0.16, 0.66, 0.66]) translate([-26.4, 19.85, 57.75]) rotate([90, 0, 0]) pin_washer();
  color([0.85, 0.48, 0.18]) translate([-26.4, 26.1, 57.75]) rotate([90, 0, 0]) lock_nut();
  color([0.55, 0.60, 0.65]) translate([36, -16.8, 10.25]) rotate([0, 0, 0]) guide_bush_a();
  color([0.75, 0.30, 0.55]) translate([36, 16.8, 10.25]) rotate([0, 0, 0]) guide_bush_b();
}

assembly();
